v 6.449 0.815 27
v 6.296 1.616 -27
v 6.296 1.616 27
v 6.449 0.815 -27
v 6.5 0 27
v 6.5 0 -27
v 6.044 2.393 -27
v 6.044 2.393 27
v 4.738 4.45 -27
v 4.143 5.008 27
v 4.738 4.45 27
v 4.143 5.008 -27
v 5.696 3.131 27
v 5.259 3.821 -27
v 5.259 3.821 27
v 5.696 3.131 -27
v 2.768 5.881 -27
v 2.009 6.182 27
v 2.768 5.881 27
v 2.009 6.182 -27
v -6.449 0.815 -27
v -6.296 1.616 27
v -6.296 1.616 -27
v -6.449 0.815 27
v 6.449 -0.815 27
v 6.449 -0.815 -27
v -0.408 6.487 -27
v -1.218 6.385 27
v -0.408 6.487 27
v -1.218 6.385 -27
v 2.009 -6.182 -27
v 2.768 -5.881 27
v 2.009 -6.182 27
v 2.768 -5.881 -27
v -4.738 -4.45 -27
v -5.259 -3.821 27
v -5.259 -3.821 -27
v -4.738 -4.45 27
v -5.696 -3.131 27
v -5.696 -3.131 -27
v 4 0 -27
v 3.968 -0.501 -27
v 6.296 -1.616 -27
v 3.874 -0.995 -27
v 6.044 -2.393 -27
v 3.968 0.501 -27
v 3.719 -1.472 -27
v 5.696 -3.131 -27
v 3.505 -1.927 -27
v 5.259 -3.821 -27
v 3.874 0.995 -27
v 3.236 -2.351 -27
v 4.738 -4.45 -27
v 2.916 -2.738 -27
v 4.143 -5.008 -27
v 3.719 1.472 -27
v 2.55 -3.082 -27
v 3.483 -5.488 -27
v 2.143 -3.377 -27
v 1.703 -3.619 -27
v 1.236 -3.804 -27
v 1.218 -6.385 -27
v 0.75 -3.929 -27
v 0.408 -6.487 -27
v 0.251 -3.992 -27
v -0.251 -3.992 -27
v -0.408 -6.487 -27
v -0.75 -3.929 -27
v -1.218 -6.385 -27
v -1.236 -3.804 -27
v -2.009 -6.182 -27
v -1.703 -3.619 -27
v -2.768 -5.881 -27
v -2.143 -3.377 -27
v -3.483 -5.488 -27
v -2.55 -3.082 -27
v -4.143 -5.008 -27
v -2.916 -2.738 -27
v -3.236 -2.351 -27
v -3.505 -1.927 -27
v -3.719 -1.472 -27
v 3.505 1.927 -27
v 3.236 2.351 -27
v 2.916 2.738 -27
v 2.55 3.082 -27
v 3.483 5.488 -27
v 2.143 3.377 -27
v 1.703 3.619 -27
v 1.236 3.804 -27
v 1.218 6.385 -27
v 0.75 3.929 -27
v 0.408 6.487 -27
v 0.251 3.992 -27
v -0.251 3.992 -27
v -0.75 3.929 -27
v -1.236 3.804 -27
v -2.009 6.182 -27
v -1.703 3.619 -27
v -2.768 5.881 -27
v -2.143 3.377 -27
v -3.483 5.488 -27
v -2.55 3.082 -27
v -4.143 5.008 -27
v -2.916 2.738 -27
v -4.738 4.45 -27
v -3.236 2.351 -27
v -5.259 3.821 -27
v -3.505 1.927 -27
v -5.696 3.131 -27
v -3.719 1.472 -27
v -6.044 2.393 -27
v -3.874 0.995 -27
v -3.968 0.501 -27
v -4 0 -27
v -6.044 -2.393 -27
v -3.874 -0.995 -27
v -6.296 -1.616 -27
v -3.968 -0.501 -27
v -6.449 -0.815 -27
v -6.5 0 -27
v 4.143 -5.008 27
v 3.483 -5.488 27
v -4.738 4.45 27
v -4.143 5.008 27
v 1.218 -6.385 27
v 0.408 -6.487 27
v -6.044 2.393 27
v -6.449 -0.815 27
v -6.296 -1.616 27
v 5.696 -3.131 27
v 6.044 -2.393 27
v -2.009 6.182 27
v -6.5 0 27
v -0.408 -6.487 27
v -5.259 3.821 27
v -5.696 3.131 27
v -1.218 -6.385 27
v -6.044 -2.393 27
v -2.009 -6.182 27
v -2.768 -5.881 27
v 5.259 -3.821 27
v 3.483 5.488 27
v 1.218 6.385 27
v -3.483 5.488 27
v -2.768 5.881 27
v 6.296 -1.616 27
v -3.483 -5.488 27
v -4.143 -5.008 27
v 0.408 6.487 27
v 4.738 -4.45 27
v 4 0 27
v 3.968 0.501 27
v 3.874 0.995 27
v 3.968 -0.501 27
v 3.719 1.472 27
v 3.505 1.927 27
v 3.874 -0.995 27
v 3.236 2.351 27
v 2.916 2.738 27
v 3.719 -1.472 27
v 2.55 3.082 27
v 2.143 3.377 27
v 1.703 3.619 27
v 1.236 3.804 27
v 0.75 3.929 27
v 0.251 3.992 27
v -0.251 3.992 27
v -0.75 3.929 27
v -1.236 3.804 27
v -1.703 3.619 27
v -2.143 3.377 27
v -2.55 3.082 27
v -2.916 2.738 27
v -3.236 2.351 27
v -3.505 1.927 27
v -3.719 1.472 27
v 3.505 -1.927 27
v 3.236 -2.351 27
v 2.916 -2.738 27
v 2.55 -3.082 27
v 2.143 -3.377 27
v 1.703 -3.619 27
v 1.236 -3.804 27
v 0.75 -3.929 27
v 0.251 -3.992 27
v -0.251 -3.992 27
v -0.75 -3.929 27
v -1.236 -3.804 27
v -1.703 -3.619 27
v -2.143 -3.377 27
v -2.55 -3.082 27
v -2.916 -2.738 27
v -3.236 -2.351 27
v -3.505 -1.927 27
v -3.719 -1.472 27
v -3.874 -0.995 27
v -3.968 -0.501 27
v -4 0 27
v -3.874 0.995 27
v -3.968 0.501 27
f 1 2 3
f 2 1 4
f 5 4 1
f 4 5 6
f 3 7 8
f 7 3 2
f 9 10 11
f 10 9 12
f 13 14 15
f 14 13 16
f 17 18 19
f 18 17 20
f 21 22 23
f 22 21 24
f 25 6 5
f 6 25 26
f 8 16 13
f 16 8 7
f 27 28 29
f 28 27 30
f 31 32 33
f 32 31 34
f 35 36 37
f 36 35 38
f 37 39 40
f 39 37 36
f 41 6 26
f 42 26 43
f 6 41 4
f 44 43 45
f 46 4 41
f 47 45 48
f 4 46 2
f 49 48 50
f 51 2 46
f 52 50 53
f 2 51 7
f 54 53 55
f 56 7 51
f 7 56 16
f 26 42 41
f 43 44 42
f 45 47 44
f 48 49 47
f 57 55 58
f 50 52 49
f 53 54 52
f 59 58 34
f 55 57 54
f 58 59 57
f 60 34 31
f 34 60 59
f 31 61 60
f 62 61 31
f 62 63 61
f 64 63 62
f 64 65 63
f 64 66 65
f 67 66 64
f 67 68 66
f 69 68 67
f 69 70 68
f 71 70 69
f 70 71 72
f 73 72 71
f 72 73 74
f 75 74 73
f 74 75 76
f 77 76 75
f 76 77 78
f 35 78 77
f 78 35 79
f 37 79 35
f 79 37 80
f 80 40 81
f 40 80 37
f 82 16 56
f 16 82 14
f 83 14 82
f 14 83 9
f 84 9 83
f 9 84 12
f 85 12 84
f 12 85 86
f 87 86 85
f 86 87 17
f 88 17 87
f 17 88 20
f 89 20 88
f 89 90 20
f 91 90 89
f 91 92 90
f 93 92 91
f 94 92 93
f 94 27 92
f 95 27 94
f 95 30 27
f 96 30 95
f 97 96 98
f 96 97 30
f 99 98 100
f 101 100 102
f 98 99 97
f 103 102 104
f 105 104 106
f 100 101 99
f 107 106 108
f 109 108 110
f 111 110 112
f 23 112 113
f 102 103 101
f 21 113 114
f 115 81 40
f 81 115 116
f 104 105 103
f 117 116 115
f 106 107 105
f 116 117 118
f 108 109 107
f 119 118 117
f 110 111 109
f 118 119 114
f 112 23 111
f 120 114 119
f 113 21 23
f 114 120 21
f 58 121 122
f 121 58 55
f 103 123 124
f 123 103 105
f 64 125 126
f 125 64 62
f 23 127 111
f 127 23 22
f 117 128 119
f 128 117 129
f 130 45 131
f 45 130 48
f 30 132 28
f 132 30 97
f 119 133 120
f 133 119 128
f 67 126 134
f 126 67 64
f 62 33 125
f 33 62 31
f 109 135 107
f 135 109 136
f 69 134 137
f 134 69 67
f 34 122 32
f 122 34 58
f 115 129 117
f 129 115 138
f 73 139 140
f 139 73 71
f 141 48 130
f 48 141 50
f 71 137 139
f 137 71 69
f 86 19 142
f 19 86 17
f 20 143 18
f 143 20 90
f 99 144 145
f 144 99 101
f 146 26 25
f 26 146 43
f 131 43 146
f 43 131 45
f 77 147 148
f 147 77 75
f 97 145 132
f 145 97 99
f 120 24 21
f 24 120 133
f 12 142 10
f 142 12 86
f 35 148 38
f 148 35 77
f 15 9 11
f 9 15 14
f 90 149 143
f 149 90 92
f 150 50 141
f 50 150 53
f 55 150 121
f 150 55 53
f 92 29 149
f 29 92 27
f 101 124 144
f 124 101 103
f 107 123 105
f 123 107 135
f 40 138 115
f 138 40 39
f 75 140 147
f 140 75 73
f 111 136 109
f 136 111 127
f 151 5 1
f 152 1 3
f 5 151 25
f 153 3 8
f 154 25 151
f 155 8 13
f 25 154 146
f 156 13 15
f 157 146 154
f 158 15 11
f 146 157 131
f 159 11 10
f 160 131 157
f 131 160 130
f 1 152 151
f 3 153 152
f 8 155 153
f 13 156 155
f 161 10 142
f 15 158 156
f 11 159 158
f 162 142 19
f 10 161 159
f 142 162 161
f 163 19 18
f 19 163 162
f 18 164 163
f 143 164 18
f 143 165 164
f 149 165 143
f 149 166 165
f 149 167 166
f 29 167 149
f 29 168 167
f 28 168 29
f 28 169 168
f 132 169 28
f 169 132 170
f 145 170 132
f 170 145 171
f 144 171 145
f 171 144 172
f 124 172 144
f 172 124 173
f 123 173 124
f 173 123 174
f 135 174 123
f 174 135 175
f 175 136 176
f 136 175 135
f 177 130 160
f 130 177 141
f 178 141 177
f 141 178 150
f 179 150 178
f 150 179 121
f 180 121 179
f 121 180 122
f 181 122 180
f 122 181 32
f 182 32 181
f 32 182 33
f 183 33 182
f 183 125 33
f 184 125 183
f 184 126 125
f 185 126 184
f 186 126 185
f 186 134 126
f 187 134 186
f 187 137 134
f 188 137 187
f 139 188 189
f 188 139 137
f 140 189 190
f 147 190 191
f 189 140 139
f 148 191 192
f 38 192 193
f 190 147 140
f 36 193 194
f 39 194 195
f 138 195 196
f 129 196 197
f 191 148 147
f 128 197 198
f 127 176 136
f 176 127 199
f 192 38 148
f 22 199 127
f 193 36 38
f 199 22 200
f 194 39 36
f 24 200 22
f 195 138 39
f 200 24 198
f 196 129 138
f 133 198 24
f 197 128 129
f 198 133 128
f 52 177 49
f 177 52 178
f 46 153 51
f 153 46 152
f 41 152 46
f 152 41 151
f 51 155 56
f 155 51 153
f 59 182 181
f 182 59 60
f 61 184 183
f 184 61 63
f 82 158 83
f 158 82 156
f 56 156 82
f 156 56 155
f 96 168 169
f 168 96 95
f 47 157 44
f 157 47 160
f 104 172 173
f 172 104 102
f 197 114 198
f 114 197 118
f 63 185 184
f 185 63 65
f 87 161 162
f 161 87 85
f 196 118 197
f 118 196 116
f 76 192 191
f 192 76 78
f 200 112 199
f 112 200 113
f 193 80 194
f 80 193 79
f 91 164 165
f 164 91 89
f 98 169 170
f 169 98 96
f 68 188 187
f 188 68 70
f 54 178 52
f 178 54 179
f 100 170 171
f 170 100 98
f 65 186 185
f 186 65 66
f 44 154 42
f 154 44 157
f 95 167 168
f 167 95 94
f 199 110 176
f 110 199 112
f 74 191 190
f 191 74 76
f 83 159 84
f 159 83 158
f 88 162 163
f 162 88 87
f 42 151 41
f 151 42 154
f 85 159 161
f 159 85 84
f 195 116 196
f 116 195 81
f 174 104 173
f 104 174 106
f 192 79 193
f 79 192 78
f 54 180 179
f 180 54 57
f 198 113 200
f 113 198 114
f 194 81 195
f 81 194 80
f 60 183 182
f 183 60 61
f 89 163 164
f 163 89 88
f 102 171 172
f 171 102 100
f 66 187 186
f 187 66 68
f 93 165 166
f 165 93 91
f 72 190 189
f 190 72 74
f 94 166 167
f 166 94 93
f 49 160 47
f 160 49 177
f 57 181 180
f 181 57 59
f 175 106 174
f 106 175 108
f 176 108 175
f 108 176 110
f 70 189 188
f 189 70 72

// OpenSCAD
$fn = 50;


difference() {
	union() {
		translate(v = [0, 0, -27.0000000000]) {
			cylinder(h = 54, r = 6.5000000000);
		}
	}
	union() {
		translate(v = [0, 0, -100.0000000000]) {
			cylinder(h = 200, r = 4.0000000000);
		}
	}
}
